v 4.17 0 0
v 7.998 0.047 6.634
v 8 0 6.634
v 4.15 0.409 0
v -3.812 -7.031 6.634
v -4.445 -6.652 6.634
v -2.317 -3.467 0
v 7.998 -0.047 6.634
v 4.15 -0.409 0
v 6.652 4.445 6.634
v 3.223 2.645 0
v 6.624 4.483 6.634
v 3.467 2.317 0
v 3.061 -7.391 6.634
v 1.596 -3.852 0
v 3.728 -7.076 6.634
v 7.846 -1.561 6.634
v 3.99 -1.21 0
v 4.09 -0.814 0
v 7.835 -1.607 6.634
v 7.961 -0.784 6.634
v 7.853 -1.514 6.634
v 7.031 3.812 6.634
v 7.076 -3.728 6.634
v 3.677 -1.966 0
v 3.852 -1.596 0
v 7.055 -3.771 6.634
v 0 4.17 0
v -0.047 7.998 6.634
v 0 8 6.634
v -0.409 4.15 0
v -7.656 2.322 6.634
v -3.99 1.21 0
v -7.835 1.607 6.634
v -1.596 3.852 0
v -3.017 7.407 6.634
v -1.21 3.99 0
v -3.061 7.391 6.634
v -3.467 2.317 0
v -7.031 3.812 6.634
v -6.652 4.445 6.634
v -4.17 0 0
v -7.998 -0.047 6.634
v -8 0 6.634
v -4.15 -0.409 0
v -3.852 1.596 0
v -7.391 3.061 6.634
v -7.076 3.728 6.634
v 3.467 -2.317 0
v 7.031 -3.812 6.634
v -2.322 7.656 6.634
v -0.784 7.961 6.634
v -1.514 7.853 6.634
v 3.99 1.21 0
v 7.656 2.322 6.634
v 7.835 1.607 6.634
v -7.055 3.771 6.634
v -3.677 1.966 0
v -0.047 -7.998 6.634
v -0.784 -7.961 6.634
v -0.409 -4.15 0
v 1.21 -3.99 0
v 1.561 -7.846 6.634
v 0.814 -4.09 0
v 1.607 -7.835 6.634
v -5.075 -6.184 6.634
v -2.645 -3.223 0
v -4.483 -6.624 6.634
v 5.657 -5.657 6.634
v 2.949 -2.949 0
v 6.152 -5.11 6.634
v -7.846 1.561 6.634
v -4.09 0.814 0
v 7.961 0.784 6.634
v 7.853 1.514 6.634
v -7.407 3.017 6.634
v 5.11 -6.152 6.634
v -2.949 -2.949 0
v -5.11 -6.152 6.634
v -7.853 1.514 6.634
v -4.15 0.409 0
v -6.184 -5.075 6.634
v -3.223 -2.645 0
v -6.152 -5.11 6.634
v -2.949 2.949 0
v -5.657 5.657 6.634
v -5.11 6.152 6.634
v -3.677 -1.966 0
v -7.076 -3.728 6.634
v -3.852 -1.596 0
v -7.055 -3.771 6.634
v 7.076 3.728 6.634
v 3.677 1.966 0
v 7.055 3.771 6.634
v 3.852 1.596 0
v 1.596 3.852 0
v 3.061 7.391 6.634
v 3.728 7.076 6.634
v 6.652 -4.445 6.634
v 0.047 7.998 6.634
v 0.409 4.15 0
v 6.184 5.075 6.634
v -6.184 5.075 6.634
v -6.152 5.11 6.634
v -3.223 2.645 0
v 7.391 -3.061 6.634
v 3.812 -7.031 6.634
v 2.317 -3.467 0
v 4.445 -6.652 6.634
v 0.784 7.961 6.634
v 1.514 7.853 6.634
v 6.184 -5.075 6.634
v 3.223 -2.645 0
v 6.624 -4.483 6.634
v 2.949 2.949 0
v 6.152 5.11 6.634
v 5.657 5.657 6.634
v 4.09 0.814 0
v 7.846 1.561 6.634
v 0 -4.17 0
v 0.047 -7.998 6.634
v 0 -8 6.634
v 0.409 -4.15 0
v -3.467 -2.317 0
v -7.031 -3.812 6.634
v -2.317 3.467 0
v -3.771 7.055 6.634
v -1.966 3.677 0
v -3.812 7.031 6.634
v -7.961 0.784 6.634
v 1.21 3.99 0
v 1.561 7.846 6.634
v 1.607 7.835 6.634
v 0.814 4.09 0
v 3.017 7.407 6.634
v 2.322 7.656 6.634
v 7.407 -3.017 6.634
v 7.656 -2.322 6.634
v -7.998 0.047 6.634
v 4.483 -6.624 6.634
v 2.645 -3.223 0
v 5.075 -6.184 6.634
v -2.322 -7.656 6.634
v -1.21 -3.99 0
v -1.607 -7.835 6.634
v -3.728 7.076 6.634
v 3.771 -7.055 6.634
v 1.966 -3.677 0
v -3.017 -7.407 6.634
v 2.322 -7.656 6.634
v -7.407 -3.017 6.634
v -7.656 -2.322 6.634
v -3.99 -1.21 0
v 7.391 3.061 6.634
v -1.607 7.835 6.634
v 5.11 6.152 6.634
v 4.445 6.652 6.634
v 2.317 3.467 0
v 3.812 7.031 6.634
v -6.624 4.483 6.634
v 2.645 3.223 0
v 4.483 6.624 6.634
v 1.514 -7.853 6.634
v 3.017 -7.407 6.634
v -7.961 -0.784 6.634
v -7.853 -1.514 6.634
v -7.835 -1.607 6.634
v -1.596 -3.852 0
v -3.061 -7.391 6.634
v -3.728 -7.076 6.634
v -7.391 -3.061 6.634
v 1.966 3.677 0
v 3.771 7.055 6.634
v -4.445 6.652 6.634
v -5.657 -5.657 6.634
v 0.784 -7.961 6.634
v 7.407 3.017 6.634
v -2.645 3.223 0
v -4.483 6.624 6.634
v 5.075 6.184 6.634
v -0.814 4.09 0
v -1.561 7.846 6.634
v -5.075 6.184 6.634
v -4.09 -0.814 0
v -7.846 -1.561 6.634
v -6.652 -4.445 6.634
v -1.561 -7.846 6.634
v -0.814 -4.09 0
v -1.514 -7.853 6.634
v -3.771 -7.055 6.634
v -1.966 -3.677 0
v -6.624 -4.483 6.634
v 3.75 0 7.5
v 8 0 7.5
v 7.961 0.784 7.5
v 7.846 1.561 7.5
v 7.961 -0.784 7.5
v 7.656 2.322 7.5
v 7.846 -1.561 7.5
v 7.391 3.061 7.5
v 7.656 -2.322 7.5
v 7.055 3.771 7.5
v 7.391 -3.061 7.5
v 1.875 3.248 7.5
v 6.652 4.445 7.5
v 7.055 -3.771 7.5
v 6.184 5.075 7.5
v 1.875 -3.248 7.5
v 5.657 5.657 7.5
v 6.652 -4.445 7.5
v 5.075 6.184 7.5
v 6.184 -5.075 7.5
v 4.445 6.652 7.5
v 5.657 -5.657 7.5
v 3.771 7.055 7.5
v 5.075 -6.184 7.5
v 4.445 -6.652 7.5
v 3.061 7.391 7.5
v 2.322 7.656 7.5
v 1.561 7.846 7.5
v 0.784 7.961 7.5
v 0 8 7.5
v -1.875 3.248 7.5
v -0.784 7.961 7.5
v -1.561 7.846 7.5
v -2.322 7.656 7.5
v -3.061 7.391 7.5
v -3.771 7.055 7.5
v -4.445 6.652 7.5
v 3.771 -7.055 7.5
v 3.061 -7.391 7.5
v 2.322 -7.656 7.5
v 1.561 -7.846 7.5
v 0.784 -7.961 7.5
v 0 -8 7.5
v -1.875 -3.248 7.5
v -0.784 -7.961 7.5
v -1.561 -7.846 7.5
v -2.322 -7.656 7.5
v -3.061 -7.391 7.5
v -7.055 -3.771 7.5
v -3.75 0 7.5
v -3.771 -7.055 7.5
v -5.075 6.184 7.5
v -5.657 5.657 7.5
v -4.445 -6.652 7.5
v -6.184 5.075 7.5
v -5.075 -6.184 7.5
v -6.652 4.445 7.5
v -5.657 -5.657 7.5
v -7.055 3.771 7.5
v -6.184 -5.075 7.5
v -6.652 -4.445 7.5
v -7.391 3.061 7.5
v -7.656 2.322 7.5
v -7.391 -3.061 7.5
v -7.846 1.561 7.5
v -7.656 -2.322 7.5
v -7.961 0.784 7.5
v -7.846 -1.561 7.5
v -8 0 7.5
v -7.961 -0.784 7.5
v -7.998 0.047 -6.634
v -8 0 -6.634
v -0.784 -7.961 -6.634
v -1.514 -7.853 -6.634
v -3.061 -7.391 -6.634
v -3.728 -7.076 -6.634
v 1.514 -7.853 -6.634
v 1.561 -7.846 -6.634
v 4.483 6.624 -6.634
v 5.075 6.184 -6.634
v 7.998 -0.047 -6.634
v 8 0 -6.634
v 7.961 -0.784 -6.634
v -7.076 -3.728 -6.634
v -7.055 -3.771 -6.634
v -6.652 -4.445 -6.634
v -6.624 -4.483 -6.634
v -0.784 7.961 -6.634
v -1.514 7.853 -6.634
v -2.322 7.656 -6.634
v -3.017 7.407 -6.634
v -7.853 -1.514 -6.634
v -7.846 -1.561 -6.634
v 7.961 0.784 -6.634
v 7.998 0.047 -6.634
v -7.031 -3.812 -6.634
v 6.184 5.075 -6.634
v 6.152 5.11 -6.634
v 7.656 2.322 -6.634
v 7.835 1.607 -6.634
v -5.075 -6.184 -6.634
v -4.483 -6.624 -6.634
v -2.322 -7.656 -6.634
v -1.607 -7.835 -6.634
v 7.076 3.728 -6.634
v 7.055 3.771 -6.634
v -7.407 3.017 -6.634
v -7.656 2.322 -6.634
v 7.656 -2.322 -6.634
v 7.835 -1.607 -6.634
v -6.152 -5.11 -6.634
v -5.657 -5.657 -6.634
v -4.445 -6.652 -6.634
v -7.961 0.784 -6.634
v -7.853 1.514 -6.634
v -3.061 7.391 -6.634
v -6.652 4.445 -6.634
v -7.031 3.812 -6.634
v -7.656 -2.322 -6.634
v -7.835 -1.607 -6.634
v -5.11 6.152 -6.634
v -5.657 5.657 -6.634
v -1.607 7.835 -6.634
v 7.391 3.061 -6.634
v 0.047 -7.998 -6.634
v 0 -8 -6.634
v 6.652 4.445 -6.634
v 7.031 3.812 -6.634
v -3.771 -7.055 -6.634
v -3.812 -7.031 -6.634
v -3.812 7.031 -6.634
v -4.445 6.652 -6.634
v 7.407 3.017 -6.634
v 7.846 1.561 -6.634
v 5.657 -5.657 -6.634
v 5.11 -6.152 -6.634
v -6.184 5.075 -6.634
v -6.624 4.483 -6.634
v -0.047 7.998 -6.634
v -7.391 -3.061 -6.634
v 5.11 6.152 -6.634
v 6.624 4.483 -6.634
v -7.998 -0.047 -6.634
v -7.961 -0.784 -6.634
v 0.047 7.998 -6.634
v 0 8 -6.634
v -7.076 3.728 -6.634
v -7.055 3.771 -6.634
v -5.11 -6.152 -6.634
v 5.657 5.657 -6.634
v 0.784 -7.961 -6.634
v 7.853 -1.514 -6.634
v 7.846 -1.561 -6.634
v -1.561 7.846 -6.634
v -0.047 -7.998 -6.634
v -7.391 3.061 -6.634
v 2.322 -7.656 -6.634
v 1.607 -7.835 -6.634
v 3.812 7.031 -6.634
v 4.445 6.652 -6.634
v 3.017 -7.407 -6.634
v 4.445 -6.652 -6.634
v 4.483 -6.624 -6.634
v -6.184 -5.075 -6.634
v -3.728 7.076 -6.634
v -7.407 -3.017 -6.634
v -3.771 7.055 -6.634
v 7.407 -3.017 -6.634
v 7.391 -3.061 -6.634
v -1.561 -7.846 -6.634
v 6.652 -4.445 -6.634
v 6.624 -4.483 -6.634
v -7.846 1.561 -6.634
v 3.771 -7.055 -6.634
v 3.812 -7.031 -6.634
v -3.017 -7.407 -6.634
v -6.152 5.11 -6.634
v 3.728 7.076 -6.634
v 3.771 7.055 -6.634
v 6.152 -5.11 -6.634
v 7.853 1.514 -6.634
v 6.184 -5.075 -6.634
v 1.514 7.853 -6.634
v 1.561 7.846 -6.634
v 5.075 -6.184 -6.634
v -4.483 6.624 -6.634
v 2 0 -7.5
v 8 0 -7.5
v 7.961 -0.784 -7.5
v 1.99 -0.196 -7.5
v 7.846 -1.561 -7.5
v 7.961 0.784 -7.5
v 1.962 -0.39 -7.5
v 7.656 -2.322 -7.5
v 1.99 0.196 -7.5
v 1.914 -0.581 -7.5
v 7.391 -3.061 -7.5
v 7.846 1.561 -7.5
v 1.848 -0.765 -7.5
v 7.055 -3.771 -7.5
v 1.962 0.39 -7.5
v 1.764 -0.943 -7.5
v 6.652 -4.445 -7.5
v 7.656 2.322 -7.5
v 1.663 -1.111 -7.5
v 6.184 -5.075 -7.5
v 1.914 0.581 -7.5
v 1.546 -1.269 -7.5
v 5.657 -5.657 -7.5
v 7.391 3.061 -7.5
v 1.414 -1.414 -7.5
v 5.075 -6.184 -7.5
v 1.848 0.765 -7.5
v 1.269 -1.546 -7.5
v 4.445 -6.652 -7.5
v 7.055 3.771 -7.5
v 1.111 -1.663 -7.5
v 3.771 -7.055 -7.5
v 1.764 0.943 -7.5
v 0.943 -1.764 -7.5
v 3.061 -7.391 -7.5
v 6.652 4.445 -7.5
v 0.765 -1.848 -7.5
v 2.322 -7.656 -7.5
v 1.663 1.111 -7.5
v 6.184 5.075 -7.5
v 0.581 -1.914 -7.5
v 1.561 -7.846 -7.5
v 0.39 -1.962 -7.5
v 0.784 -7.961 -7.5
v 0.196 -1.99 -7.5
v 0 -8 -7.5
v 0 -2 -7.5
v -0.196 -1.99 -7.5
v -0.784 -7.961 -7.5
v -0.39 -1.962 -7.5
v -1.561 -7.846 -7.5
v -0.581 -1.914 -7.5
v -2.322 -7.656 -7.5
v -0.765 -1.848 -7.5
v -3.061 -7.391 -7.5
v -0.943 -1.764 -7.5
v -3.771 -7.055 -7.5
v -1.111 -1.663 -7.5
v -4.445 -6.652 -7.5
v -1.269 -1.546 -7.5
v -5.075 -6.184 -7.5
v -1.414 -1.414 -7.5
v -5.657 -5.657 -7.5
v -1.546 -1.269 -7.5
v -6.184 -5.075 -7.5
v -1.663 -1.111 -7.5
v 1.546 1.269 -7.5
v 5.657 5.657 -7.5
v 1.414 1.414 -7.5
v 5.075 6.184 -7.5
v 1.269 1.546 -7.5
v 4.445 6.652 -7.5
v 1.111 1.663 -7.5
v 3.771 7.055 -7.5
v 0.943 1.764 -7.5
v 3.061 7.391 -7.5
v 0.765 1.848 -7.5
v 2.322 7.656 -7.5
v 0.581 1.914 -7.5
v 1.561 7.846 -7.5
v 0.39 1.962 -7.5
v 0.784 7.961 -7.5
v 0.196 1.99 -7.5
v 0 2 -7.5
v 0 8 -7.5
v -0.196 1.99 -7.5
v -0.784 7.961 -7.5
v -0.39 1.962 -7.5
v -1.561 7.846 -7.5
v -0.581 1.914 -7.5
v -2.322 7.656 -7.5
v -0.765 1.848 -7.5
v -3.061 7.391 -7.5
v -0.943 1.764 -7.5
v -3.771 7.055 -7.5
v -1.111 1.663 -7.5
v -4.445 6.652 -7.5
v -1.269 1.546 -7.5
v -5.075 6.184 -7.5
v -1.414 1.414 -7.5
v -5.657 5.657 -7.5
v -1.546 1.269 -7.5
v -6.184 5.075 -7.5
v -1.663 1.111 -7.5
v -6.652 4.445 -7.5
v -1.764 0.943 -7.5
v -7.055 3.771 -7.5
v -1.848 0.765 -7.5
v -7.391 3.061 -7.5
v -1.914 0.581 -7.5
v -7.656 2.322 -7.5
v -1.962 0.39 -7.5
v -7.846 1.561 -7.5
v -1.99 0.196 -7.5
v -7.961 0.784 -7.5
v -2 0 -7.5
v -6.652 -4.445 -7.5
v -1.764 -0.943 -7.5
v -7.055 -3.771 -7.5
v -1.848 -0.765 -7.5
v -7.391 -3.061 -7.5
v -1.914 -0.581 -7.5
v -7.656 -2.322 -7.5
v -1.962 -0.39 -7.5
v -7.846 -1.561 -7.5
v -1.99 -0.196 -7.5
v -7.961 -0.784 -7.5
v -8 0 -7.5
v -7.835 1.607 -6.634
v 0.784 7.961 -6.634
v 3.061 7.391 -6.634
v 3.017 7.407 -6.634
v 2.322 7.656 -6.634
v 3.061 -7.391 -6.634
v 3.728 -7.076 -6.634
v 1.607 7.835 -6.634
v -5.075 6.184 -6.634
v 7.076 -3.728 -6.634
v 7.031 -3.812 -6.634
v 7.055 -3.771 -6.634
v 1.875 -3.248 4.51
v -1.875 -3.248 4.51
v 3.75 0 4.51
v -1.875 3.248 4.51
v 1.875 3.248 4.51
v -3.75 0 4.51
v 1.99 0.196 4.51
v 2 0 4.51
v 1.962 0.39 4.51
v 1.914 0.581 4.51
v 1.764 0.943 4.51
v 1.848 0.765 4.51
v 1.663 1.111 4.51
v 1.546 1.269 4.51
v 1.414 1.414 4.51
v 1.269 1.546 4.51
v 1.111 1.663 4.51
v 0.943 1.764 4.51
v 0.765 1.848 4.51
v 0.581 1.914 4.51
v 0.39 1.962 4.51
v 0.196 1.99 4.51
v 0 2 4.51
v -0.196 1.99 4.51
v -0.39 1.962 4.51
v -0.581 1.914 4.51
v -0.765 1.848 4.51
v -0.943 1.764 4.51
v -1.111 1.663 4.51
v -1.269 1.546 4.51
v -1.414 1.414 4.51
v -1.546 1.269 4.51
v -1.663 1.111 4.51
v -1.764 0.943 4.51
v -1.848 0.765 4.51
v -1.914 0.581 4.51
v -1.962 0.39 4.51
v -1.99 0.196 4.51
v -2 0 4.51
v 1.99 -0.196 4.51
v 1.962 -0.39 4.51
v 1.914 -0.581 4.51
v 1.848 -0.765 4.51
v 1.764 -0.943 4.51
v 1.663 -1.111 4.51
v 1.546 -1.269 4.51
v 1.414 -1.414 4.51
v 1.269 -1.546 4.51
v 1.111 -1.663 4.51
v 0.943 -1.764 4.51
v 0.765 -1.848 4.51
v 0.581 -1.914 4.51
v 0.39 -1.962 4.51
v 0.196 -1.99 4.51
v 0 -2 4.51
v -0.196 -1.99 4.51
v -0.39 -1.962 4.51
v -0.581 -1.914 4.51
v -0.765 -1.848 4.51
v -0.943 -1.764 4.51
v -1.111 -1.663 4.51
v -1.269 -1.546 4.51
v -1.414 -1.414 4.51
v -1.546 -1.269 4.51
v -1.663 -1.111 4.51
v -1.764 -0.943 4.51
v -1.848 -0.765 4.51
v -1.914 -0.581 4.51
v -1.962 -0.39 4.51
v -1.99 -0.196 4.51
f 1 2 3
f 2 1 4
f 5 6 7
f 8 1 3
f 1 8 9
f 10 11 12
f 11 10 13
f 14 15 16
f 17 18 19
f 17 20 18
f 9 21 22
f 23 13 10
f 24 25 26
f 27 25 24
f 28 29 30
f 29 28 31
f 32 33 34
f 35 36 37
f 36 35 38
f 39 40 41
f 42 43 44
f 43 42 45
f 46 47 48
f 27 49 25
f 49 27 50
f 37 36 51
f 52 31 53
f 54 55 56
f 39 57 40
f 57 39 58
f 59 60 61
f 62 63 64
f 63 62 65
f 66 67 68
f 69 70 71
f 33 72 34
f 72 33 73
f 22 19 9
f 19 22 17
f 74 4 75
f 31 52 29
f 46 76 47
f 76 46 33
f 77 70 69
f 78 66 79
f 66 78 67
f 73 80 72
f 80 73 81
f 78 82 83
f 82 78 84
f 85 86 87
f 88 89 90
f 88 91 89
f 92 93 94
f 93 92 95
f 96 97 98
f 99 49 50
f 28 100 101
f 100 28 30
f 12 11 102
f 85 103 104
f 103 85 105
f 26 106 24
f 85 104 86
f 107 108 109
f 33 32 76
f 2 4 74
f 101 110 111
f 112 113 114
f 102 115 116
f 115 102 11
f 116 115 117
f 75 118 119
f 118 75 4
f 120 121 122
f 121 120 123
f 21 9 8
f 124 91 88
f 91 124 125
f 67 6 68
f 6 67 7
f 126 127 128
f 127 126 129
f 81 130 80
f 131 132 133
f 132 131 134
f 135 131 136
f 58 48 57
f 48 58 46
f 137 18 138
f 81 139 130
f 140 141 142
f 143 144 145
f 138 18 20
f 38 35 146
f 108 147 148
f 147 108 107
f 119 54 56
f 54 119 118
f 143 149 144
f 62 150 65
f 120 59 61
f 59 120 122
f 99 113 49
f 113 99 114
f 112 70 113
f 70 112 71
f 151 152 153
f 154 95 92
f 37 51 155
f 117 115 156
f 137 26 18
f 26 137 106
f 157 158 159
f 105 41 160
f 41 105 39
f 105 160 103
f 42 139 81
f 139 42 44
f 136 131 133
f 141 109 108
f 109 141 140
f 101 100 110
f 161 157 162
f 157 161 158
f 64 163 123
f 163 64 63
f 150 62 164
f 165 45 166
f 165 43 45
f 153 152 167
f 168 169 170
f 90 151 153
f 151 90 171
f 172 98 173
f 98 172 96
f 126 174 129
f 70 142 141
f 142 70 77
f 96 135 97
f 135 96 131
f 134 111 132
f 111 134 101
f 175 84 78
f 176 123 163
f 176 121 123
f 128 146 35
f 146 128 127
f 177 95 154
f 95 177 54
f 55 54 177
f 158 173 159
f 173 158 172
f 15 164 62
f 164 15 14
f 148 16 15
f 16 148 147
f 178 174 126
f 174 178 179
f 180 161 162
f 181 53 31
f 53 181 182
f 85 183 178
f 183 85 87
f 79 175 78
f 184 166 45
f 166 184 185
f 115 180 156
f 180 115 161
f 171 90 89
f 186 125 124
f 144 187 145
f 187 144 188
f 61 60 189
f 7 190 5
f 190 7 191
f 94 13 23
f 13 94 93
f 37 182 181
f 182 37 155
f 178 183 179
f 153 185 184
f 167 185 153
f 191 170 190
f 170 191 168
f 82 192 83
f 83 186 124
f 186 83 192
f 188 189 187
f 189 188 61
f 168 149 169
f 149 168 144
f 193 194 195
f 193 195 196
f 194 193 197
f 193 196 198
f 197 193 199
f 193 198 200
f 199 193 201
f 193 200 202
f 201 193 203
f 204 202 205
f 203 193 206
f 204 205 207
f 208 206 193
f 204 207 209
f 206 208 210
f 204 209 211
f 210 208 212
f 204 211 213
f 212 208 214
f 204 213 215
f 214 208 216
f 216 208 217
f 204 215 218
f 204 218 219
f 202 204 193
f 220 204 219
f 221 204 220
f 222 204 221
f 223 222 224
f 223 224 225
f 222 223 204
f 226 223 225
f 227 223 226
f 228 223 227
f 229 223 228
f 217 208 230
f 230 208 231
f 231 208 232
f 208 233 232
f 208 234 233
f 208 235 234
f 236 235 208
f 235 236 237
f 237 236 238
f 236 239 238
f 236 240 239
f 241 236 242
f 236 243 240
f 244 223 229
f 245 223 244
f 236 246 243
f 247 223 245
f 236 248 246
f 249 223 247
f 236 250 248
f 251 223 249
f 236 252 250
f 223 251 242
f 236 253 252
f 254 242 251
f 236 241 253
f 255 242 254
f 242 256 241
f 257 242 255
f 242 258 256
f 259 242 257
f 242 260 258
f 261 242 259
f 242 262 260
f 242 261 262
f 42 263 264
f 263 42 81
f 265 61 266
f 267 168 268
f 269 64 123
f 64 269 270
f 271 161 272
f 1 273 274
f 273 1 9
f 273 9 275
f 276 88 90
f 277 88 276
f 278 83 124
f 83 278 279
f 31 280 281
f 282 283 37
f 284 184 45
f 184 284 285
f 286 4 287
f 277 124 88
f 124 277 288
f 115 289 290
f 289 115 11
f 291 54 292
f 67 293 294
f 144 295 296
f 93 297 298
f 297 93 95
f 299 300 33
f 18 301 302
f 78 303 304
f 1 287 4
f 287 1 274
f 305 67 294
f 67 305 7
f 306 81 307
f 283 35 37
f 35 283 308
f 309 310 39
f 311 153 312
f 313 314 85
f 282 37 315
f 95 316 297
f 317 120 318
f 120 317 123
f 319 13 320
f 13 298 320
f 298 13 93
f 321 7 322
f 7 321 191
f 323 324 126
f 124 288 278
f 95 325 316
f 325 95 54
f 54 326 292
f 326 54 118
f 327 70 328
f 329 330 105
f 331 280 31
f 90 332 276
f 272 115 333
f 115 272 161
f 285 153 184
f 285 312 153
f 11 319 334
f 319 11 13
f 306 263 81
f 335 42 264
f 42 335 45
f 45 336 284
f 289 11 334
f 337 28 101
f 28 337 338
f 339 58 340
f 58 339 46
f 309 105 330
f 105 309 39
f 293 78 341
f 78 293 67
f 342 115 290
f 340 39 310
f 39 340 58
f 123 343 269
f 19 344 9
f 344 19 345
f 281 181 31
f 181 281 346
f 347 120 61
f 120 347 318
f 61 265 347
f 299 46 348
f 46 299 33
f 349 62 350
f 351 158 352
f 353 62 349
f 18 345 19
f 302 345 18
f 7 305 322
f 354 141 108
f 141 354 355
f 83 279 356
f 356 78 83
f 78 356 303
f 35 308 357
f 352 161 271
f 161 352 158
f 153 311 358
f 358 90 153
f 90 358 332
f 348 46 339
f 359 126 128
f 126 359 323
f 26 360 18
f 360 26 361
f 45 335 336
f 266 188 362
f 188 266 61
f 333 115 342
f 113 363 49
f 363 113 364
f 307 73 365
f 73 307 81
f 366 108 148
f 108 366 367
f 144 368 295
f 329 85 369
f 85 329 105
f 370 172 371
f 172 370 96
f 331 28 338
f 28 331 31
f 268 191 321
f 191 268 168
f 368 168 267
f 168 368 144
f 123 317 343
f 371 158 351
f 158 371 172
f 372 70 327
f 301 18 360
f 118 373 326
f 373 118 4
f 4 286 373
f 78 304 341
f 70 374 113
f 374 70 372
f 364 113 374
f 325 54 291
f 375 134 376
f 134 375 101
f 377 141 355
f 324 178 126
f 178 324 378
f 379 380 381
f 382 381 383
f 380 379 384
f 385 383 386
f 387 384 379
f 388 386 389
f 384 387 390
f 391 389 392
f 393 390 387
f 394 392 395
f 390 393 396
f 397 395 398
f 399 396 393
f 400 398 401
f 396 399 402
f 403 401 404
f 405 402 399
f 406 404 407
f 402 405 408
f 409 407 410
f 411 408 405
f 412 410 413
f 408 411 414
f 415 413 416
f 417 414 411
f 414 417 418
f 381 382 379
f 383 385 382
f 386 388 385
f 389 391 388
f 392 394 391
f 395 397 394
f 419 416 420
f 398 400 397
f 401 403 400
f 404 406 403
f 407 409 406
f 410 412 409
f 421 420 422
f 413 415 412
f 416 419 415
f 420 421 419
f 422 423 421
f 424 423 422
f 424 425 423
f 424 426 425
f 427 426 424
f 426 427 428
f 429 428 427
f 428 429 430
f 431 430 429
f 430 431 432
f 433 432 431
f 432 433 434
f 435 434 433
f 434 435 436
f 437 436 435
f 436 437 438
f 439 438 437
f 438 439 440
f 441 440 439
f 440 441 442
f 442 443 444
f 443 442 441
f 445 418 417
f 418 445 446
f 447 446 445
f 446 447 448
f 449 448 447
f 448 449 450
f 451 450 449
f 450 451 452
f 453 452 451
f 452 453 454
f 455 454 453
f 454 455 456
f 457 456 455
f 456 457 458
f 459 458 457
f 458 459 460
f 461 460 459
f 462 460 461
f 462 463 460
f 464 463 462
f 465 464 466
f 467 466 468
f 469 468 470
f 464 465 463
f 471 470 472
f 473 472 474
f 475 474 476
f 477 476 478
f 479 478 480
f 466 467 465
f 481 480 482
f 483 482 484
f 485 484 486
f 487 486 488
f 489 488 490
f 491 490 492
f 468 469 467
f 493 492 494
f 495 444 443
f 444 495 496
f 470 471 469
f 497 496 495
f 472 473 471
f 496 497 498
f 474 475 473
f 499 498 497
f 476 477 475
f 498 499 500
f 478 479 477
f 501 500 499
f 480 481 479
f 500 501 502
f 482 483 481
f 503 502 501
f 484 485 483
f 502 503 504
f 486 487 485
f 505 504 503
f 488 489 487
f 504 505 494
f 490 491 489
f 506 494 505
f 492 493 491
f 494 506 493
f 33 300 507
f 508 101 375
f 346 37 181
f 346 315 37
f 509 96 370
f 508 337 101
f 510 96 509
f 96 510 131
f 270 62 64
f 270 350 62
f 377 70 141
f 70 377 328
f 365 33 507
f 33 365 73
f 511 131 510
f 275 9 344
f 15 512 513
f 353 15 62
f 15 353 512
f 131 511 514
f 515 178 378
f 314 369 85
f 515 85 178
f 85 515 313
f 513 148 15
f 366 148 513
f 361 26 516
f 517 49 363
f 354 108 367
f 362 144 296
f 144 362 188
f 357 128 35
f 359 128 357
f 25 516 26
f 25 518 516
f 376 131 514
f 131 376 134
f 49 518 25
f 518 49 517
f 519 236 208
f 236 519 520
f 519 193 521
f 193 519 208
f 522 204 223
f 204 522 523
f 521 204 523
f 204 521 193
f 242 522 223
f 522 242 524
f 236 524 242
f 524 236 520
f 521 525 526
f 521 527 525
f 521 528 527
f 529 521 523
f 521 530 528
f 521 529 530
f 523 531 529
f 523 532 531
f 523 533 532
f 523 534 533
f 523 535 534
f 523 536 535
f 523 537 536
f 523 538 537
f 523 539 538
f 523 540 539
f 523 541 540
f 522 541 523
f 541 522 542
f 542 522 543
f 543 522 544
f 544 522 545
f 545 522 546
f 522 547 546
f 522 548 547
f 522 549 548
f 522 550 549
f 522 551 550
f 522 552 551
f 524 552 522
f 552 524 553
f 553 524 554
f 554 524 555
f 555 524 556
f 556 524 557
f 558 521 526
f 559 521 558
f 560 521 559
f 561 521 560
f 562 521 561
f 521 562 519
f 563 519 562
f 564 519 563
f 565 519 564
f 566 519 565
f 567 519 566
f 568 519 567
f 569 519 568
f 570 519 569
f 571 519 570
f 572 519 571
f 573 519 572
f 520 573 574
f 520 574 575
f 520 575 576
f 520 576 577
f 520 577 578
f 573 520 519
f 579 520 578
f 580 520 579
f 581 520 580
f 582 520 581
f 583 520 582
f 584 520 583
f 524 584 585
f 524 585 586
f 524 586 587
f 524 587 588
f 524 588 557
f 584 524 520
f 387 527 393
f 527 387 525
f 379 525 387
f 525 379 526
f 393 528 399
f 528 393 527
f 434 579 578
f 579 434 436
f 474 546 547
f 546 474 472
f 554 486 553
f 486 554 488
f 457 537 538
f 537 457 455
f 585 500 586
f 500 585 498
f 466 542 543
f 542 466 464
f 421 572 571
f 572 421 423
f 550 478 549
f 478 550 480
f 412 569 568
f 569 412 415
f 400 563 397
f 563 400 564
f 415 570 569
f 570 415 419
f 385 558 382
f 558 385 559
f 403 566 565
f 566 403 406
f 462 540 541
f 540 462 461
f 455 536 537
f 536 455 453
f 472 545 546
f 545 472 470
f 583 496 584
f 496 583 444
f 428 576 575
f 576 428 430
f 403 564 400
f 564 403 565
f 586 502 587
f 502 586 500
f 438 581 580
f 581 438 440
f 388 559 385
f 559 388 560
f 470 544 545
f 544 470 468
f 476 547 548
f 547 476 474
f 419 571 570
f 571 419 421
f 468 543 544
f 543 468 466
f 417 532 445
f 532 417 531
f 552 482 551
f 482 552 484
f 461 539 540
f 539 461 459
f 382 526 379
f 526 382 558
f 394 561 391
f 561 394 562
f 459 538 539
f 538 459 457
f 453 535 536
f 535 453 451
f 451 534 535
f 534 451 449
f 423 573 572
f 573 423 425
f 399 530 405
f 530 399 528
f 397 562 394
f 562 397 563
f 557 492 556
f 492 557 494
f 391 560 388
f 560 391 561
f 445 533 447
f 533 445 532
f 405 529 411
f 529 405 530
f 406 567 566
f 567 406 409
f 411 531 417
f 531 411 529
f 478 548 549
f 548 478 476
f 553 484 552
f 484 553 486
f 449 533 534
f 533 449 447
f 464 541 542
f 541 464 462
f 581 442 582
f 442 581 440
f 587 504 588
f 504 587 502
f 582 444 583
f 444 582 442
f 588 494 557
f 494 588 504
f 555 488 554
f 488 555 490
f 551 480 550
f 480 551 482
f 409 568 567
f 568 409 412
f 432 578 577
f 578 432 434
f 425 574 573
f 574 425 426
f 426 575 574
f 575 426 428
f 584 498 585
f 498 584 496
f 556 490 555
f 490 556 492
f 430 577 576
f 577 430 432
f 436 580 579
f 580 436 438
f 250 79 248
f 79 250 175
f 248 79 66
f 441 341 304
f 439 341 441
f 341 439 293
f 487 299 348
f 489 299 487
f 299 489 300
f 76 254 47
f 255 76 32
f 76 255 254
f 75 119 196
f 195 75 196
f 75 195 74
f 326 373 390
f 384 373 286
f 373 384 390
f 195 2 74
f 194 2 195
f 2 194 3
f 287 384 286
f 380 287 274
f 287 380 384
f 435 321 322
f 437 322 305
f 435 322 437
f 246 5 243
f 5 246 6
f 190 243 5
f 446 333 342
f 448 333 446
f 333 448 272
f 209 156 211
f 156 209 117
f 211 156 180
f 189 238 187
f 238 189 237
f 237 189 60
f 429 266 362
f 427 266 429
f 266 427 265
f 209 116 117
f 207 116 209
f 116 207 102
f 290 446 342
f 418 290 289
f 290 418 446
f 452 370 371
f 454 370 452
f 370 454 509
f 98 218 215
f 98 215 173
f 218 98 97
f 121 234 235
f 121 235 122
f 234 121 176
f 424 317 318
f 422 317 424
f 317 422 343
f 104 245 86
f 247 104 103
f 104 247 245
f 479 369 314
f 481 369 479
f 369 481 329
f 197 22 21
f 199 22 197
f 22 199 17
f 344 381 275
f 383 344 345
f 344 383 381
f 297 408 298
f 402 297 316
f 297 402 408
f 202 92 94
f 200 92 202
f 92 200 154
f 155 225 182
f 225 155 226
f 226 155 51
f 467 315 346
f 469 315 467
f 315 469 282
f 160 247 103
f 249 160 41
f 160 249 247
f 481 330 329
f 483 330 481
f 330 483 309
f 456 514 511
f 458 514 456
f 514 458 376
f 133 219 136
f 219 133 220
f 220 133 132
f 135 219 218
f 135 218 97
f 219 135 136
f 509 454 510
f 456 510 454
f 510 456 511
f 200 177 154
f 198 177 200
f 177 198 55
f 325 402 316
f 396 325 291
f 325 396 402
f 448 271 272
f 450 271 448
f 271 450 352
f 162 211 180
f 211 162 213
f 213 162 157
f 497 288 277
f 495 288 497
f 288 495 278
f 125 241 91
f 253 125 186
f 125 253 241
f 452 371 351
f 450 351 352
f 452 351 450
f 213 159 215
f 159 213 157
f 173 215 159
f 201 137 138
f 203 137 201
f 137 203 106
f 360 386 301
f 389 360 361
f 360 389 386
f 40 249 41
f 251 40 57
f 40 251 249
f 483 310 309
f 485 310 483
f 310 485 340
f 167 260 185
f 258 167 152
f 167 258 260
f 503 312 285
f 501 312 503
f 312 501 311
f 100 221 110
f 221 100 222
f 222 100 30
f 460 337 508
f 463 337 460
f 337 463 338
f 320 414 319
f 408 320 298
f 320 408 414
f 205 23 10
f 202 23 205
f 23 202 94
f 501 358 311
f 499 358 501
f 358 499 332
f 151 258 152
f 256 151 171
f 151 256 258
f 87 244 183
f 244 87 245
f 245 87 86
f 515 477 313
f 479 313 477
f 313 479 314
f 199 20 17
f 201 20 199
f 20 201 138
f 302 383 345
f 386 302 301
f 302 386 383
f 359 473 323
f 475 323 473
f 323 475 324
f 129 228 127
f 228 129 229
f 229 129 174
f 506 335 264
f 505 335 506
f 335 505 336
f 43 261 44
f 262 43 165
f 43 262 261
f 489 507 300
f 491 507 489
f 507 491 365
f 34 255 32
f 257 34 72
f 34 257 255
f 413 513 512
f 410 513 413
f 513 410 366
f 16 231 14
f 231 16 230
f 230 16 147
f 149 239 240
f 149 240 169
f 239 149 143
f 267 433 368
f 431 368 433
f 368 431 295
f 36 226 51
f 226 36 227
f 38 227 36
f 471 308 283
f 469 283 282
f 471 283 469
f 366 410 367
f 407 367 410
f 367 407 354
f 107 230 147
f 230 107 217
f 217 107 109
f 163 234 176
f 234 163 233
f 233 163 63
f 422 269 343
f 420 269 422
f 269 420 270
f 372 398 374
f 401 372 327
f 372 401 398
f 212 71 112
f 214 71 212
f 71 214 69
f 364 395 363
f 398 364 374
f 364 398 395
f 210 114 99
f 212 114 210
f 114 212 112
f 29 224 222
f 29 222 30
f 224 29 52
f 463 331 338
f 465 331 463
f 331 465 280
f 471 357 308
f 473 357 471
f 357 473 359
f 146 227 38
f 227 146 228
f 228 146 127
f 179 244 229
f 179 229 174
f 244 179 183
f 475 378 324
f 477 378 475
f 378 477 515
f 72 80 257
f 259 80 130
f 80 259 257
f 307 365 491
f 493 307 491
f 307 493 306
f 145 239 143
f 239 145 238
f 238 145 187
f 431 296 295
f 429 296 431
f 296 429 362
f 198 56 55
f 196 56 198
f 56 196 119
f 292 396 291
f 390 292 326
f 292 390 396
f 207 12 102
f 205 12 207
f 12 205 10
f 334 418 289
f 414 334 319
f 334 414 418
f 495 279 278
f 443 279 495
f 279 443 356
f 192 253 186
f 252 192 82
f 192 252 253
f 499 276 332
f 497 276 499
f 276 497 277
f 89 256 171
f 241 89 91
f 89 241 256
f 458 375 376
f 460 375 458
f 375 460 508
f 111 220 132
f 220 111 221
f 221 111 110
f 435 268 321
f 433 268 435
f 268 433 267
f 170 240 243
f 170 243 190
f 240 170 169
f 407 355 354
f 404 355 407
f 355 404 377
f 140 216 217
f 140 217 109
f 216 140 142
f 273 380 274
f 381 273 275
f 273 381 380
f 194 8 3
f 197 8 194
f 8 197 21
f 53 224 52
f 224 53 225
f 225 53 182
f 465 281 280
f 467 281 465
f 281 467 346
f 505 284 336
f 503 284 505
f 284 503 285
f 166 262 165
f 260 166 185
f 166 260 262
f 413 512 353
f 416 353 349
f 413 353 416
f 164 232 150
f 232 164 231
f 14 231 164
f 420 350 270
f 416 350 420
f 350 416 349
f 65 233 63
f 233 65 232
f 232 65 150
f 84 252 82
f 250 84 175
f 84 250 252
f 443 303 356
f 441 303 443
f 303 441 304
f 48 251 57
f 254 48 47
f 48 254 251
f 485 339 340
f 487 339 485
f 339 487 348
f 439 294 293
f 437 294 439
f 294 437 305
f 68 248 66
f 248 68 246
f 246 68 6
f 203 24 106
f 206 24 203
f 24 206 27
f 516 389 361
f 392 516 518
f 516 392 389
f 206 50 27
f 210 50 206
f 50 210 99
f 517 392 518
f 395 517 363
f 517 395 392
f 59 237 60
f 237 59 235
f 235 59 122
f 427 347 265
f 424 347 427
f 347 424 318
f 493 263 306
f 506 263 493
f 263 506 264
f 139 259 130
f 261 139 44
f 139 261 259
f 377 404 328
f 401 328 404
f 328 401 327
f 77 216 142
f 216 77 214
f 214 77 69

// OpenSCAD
//Revision 1.0 released 1 SEPT 15
//by Siti



//Desired height of hanger
Height = 15;
//Desired Overall Dimension for hanger
OD = 16;
//Measured Overall Dimension of thread
Thread_OD = 3;

threadTol = 6*1;
//Measured diameter of nut (across corners)
Nut_OD = 6.7;
//Number of sides of nut
Nut_Sides = 6; //[4,6]
//Depth of nut
Nut_Depth = 3;
//Clearance around thread, no need to touch this unless you're having clearance issues.
Thread_Clearance = 1;
//Clearance around nut, no need to touch this unless you're having clearance issues.
Nut_Clearance =0.8;
NutCutoutD = Nut_OD+Nut_Clearance;
//angle of guide from vertical. Probably no need to touch this.
Angle = 30;

fudge = 0.01*1;
edge=1*1;

GrooveR = (edge+OD)/2-(tan(Angle)*(Height/2));

intersection()
{
difference()
{
    //things to add
    union()
    {
        //top cone
        translate([0,0,Height/4])cylinder( r2 = (OD+edge)/2, r1 = GrooveR, center=true, h = Height/2,$fn=64);
        //bottom cone
         rotate([0,180,0])translate([0,0,Height/4])cylinder( r2 = (OD+edge)/2, r1 = GrooveR, center=true, h = Height/2,$fn=64);
        
    };
    
    //things to subtract
    union()
    {
       translate([0,0,Height/2-Nut_Depth/2+fudge])cylinder(d=NutCutoutD, h = Nut_Depth,center=true, $fn=Nut_Sides); 
        
        cylinder(h = Height+fudge,d=Thread_OD+Thread_Clearance,center=true,$fn=64);
    };
    
}

cylinder(h=Height,d=OD,center=true,$fn=64);

}
